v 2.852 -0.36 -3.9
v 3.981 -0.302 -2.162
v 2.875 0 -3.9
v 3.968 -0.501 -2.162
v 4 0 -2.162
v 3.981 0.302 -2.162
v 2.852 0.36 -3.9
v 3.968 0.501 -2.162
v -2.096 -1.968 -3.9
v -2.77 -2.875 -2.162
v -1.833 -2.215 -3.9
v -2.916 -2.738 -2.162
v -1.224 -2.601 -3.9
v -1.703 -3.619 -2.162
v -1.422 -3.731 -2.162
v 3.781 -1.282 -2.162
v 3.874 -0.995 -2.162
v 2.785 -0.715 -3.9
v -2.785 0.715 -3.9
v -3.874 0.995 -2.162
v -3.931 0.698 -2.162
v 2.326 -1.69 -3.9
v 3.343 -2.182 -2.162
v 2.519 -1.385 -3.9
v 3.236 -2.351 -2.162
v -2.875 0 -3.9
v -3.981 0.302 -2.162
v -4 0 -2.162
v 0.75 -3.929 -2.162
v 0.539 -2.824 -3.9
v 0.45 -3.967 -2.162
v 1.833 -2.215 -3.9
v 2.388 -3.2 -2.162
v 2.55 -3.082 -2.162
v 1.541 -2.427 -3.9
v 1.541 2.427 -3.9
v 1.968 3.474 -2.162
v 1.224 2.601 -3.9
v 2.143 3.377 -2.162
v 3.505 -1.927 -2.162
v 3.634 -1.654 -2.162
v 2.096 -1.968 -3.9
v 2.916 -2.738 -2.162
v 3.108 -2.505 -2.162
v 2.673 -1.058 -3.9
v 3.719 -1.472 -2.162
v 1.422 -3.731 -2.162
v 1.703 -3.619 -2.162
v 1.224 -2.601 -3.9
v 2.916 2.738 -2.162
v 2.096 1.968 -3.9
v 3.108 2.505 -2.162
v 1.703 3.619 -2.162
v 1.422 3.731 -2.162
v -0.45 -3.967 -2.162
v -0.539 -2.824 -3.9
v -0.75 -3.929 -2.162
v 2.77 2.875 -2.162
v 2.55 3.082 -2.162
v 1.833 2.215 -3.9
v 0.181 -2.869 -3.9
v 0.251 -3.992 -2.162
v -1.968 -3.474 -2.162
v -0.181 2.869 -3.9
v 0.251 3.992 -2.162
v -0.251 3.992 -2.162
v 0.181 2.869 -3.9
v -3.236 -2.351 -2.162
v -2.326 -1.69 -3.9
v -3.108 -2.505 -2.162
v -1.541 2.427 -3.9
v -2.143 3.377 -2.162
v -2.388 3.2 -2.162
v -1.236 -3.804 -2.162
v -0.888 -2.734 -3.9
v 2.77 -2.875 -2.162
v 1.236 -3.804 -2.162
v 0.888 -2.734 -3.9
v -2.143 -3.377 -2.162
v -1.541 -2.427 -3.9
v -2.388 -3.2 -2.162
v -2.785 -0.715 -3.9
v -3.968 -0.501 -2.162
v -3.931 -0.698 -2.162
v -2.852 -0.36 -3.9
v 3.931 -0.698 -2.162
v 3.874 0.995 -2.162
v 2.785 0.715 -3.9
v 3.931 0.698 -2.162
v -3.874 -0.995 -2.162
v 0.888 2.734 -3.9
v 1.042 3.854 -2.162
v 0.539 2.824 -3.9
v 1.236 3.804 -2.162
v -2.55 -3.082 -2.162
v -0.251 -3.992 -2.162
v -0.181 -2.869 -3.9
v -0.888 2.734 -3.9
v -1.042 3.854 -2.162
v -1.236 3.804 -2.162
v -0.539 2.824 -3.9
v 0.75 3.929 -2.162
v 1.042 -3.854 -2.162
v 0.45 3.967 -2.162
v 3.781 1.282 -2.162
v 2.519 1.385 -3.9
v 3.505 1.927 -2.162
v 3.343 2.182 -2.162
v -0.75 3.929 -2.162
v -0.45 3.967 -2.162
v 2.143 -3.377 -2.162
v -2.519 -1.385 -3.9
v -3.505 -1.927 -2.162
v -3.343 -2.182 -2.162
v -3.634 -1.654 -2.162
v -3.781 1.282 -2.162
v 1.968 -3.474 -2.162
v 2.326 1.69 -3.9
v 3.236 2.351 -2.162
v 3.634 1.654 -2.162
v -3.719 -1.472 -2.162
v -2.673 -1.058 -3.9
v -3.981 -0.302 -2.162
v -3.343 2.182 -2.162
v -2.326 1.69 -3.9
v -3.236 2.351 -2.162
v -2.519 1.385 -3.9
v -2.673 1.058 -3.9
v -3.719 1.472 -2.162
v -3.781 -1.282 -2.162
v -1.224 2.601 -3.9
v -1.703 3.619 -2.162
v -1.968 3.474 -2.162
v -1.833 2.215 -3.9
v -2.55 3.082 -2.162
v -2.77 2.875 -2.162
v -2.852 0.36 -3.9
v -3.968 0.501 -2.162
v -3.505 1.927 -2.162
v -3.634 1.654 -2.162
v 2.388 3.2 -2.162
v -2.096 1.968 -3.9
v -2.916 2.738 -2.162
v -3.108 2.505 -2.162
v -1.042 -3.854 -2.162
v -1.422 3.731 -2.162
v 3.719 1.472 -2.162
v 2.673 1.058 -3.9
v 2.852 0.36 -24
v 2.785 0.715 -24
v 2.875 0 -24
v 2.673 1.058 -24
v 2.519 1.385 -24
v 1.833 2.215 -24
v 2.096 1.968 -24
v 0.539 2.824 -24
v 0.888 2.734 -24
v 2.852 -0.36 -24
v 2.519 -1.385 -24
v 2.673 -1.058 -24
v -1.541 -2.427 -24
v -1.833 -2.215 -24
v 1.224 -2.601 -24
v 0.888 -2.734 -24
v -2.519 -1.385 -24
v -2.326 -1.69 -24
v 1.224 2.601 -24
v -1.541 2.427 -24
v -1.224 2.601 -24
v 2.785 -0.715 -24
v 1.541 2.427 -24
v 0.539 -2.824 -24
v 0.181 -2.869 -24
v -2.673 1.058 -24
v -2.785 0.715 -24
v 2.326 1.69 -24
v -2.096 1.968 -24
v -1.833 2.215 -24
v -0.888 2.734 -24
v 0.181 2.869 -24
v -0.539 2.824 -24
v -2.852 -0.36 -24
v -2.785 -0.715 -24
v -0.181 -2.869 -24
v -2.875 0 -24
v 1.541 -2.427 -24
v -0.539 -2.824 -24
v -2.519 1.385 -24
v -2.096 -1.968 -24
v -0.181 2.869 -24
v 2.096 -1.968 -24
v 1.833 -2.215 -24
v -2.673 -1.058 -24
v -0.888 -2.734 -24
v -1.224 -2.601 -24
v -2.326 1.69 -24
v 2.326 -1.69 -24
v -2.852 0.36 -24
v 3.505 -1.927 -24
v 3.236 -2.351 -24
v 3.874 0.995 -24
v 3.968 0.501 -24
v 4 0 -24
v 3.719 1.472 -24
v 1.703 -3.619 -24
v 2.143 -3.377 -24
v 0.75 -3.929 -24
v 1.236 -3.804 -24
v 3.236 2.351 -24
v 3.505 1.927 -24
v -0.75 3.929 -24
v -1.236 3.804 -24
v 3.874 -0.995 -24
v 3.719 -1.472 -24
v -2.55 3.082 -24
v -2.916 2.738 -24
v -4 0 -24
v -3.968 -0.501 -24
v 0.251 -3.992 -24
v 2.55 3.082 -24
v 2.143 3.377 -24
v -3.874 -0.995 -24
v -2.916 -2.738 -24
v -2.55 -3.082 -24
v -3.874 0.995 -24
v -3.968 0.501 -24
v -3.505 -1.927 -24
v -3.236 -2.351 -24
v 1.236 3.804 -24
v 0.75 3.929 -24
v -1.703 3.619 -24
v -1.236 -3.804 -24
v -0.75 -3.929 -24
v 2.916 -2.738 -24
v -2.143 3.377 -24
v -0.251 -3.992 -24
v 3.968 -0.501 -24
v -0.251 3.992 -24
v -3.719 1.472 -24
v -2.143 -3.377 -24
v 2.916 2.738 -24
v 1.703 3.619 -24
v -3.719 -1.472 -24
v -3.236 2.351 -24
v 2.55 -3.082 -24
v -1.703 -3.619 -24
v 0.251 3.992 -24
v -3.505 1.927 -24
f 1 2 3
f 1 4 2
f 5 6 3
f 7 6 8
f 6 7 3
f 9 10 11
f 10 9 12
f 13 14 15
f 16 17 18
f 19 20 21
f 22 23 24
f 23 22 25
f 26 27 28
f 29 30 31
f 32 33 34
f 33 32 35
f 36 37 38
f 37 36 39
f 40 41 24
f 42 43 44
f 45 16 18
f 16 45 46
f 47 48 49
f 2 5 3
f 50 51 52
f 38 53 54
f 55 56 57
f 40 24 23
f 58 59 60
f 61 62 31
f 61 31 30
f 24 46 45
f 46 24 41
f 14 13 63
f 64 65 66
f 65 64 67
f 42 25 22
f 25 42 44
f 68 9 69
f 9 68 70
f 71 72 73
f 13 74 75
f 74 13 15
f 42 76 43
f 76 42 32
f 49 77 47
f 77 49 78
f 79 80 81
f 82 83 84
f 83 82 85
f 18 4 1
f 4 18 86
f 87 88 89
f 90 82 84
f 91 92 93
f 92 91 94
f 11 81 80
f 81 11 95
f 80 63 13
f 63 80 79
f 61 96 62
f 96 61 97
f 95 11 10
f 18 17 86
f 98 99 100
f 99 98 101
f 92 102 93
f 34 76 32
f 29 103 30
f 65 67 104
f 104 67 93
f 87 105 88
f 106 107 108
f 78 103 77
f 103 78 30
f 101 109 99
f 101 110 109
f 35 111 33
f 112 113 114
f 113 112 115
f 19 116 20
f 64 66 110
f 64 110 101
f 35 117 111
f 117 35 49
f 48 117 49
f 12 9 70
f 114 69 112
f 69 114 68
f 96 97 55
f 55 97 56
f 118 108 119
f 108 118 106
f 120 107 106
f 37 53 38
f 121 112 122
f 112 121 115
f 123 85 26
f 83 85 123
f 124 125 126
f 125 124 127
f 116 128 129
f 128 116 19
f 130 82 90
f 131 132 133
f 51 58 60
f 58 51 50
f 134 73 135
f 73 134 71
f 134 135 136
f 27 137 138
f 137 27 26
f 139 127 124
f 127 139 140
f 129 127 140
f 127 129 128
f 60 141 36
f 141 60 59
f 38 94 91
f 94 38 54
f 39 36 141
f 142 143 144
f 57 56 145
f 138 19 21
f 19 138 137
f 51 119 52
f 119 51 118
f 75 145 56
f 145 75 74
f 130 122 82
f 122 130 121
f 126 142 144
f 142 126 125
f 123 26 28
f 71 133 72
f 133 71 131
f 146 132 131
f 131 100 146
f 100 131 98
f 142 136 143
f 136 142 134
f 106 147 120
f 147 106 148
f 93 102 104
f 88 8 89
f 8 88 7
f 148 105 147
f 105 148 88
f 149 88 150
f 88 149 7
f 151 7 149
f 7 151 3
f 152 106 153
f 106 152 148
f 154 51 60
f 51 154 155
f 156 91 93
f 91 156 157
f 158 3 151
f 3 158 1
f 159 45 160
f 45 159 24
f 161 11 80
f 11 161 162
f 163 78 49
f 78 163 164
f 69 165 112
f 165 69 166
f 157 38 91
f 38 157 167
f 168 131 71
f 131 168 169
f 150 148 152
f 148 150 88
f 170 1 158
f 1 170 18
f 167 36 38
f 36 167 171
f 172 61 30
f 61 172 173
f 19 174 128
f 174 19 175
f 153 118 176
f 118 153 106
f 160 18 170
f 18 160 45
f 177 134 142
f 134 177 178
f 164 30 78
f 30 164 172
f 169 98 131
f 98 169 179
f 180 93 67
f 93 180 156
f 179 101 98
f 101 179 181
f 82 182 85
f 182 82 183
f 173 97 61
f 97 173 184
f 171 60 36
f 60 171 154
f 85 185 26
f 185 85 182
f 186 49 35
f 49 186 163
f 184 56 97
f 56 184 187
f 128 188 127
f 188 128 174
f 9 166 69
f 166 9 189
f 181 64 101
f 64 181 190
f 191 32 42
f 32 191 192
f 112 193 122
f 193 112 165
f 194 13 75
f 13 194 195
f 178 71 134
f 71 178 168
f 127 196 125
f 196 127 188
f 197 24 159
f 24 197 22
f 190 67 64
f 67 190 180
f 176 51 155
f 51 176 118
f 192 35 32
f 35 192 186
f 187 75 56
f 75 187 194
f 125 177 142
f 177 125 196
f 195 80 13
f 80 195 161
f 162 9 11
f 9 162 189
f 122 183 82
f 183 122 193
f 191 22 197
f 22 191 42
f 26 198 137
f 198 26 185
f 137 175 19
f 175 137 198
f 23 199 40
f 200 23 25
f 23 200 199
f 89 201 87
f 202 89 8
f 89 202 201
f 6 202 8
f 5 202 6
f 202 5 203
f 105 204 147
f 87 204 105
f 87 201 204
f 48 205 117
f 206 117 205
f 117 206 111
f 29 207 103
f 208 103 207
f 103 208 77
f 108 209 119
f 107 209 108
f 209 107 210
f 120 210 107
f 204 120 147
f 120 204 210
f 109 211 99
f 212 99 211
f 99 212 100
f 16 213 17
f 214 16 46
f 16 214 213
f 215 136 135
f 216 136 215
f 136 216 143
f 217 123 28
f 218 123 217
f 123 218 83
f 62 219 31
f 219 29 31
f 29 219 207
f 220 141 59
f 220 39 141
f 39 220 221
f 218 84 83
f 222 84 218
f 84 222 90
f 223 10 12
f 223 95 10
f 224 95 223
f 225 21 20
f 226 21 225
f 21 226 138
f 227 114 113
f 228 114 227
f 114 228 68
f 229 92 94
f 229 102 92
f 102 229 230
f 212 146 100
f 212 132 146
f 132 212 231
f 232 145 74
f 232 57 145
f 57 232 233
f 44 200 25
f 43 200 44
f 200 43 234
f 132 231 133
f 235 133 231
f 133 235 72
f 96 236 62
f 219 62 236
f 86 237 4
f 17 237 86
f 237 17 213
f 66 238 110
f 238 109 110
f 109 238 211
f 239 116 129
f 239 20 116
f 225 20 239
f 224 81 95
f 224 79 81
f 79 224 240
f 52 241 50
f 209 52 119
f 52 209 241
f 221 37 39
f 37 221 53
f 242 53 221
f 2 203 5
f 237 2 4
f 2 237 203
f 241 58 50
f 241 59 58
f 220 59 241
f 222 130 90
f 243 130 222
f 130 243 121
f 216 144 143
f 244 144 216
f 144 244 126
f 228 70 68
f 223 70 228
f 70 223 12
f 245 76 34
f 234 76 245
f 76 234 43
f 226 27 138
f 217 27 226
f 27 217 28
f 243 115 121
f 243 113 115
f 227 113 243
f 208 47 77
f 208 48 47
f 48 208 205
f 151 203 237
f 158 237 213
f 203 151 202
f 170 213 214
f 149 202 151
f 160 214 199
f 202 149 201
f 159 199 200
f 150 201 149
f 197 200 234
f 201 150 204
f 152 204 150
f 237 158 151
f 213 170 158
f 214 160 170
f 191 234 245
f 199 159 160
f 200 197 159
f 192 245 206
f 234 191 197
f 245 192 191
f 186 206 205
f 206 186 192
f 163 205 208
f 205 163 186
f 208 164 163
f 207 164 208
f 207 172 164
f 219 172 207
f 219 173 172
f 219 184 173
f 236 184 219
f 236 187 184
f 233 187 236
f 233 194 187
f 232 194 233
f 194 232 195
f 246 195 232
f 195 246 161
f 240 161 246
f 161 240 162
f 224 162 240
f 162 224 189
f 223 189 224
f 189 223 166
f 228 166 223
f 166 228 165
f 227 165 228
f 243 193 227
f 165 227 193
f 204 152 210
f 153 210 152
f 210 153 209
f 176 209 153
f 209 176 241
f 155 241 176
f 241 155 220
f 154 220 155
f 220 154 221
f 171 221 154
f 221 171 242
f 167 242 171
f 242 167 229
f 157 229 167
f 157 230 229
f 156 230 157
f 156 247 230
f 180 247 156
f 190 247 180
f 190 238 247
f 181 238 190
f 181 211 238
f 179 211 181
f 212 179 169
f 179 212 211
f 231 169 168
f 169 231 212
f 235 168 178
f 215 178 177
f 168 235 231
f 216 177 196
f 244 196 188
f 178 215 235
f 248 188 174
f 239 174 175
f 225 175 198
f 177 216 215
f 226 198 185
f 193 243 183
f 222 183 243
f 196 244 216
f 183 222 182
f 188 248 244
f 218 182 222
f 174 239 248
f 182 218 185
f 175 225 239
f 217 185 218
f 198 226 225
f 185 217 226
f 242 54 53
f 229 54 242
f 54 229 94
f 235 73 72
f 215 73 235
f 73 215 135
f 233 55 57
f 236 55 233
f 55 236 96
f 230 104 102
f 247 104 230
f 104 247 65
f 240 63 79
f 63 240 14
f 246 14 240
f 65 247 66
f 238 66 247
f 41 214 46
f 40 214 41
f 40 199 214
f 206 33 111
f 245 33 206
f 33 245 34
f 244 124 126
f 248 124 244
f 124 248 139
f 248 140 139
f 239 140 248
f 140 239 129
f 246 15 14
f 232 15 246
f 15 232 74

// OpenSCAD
$fn = 50;

difference() {
	union() {
		translate(v = [0, 0, -24.0]) {
			cylinder(h = 24, r = 4.0);
		}
	}
	union() {
		translate(v = [0, 0, 0]) {
			rotate(a = [0, 0, 0]) {
				difference() {
					union() {
						translate(v = [0, 0, -27.0]) {
							cylinder(h = 27, r = 2.6);
						}
						translate(v = [0, 0, -3.9]) {
							cylinder(h = 3.9, r1 = 2.875, r2 = 5.4);
						}
						translate(v = [0, 0, -27.0]) {
							cylinder(h = 27, r = 2.875);
						}
						translate(v = [0, 0, -27.0]) {
							cylinder(h = 27, r = 2.6);
						}
					}
					union();
				}
			}
		}
	}
}
